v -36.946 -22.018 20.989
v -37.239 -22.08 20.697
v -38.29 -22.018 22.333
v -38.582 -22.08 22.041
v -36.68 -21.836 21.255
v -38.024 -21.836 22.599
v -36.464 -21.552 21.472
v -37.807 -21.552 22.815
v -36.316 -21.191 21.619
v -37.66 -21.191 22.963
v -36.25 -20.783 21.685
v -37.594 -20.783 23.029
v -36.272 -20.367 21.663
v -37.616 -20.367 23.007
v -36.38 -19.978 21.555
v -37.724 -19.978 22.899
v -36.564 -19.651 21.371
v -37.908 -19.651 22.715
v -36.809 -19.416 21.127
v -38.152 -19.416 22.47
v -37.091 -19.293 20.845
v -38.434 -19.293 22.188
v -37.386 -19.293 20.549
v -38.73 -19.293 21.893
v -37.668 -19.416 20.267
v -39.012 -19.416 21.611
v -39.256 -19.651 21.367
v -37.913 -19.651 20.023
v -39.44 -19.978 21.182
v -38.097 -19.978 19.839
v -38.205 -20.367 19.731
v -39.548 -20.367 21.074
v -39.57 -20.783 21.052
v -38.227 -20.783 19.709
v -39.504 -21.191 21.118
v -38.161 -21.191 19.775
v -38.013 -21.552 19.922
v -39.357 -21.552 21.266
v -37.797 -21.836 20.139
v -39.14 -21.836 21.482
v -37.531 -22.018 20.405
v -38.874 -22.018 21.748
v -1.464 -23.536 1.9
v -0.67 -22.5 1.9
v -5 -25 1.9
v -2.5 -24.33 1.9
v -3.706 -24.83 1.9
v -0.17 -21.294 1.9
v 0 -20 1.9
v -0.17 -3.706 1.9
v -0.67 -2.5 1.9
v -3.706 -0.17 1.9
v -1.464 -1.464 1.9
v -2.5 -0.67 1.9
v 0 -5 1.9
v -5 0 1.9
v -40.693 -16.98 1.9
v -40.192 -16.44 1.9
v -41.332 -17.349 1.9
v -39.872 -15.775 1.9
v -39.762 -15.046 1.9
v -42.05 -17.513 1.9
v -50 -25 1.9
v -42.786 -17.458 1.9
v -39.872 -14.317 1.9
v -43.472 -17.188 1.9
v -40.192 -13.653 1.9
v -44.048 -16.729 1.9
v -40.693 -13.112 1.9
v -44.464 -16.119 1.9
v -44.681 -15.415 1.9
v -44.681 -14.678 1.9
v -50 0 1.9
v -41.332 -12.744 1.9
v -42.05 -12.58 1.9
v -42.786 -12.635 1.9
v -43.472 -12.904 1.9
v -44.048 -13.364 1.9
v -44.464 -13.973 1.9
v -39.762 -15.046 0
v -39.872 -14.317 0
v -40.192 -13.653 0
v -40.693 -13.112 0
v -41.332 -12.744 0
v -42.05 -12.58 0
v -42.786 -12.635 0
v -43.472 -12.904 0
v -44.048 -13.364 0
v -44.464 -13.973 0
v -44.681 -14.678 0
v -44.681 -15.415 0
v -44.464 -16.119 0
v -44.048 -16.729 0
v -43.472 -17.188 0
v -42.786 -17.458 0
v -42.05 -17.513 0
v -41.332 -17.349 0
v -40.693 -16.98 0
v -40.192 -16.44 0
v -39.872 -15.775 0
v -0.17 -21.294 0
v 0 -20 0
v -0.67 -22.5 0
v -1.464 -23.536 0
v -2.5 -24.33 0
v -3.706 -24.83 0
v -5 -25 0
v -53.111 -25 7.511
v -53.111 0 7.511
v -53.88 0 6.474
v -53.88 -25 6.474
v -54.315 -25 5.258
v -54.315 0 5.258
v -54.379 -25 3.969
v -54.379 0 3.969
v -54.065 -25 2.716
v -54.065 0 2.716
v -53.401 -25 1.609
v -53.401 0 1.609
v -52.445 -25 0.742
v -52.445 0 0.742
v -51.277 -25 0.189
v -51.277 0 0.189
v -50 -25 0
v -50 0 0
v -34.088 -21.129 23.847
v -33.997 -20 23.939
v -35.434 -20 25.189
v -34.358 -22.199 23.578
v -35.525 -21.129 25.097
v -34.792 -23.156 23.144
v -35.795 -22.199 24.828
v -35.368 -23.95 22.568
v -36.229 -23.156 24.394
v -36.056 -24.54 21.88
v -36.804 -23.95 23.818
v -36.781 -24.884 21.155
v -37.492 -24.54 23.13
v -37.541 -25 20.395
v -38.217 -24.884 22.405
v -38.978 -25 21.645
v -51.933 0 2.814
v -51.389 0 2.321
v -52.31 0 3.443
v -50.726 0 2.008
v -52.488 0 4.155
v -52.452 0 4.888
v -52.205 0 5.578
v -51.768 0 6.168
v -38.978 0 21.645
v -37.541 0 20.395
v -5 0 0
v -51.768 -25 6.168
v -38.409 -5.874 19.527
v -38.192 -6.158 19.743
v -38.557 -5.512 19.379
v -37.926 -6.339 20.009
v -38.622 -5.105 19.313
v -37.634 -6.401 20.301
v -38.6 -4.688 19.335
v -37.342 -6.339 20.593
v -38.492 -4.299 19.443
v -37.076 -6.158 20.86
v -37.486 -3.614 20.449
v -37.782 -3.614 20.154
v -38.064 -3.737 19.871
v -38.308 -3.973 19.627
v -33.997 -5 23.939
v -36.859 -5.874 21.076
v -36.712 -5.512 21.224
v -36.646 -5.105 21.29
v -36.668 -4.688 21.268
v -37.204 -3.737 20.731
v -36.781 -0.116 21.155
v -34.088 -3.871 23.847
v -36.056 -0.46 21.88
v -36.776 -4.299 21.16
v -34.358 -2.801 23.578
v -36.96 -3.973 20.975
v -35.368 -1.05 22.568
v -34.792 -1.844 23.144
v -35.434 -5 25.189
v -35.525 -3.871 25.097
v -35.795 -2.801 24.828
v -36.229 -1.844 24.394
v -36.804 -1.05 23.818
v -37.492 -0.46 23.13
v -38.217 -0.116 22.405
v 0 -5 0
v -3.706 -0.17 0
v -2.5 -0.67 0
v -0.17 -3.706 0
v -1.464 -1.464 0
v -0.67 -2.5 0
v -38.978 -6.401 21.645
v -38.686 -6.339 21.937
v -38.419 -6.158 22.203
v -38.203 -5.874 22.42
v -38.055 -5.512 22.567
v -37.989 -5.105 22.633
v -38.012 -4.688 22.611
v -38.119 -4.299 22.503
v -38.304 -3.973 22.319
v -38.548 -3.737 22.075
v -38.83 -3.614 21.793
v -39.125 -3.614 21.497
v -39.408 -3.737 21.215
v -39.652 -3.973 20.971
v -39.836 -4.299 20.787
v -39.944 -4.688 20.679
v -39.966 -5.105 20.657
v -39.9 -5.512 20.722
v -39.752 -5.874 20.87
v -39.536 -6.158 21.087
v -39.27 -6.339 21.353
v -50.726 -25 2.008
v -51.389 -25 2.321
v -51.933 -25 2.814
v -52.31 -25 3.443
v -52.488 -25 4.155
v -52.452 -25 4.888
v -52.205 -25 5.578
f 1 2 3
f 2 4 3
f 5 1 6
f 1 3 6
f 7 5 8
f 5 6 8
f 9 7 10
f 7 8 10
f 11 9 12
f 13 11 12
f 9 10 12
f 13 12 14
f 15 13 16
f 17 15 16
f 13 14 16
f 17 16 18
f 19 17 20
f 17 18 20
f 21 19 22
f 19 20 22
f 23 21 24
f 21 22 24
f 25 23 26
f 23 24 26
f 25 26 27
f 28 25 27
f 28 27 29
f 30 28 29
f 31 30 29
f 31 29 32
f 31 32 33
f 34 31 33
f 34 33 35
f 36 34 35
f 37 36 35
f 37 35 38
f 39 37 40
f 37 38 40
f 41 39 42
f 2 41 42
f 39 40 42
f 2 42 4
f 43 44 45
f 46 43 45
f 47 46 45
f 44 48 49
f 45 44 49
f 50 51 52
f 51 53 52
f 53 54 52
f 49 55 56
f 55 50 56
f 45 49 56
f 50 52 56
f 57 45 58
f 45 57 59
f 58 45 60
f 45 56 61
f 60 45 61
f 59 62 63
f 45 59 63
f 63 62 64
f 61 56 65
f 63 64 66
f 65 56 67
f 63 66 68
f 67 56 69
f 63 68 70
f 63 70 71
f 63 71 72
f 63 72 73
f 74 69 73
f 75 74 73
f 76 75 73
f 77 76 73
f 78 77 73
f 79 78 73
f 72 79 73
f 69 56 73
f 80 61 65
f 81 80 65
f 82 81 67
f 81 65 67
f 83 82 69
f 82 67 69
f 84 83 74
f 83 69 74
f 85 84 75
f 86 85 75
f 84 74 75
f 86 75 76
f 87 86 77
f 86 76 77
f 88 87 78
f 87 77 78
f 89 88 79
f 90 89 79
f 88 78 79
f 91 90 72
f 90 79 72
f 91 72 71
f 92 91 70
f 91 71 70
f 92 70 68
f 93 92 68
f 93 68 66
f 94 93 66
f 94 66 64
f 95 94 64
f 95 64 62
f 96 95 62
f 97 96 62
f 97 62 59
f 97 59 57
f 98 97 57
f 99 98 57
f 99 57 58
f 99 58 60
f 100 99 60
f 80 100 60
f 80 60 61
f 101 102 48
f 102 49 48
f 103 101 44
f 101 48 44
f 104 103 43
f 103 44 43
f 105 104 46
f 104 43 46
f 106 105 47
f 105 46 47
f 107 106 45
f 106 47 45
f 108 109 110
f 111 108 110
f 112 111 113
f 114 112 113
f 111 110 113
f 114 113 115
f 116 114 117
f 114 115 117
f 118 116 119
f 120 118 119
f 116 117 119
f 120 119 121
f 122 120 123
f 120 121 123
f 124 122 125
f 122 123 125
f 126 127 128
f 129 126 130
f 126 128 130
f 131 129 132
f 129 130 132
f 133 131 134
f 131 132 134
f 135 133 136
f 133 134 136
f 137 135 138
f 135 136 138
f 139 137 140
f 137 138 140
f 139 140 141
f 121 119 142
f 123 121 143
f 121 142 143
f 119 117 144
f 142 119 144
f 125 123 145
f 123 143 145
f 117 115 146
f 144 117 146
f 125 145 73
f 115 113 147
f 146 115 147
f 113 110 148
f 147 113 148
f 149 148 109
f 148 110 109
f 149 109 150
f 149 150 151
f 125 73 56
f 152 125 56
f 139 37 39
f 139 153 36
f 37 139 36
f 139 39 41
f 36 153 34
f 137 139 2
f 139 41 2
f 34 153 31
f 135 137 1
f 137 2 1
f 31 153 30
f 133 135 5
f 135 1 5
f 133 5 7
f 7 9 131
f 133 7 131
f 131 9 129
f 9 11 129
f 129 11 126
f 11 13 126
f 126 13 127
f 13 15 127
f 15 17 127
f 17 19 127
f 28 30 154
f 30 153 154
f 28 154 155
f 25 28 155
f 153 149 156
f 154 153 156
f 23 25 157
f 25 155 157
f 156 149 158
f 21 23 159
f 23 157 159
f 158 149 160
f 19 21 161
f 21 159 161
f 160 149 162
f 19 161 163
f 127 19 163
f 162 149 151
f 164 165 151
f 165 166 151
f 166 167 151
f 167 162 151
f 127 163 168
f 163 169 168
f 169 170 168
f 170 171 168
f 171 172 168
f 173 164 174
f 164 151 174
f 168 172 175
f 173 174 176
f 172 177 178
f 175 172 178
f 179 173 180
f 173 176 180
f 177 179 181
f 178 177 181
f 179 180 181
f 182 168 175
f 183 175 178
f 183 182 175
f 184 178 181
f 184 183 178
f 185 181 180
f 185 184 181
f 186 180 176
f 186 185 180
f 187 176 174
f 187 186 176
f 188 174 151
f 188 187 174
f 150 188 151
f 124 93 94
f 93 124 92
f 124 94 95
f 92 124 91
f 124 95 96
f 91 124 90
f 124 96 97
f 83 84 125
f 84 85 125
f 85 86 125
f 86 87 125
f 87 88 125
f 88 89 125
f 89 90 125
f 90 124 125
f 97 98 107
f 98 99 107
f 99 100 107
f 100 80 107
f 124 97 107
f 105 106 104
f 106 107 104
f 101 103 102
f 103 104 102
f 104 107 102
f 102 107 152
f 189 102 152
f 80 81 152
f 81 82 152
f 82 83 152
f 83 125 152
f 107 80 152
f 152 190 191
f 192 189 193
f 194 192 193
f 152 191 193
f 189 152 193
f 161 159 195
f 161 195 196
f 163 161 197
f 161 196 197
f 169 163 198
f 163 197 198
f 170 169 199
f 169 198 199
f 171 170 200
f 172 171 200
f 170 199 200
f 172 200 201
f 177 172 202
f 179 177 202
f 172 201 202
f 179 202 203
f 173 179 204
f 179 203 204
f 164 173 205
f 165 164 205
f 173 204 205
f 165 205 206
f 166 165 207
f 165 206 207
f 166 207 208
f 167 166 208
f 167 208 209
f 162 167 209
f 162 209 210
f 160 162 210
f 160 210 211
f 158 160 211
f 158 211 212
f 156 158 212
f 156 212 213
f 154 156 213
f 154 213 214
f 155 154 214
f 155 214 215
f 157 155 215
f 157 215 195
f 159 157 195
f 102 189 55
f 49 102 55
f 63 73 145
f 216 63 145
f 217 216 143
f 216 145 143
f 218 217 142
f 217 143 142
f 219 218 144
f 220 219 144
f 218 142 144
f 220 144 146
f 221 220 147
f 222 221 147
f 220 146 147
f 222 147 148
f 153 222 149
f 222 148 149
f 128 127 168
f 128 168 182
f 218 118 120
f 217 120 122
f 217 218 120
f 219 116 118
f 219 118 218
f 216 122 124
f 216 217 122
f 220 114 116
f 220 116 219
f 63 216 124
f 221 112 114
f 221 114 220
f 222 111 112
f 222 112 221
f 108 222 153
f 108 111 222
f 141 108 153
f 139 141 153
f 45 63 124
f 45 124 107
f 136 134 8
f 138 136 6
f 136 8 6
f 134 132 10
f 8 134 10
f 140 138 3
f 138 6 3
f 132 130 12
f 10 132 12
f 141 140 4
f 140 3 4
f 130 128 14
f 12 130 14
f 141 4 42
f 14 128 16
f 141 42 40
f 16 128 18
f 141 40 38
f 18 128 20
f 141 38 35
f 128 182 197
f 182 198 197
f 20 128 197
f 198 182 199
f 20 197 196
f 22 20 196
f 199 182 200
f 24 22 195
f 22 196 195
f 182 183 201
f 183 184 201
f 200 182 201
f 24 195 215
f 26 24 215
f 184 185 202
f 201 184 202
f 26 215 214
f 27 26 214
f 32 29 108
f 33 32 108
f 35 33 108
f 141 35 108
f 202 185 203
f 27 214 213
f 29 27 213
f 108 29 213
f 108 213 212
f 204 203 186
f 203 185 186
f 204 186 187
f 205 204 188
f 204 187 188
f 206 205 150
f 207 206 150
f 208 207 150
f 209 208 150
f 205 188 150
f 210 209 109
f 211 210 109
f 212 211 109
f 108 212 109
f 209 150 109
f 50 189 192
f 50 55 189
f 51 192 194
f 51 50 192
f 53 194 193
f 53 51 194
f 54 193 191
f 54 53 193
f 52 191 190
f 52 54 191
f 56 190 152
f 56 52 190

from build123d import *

# Parameters (mm, degrees)
F2_DEPTH = 25
F3_R     = 5
F4_R     = 1.401412
F5_DEPTH = 12.5
F6_R     = 2.473505
F7_DEPTH = 1.901001


with BuildPart() as f2:
    # F0 (on Front) → F2 (new body)
    with BuildSketch(Plane.XZ):
        with BuildLine():
            Line((-50, 0), (0, 0))
            Line((0, 0), (0, 1.900001))
            Line((0, 1.900001), (-50, 1.900001))
            ThreePointArc((-50, 1.900001), (-52.309698, 3.443292), (-51.767766, 6.167766))
            Line((-51.767766, 6.167766), (-33.996891, 23.938641))
            Line((-33.996891, 23.938641), (-35.4336, 25.188939))
            Line((-35.4336, 25.188939), (-53.11127, 7.51127))
            ThreePointArc((-53.11127, 7.51127), (-54.06507, 2.716193), (-50, 0))
        make_face()
    extrude(amount=F2_DEPTH)

    # F3
    f3_edges = [f2.edges().sort_by_distance(p)[0] for p in [
        (-34.715246, -25, 24.56379),
        (-34.715246, 0, 24.56379),
        (0, -25, 0.950001),
        (0, 0, 0.950001),
    ]]
    fillet(f3_edges, radius=F3_R)

    # F4 (on face) → F5 (cut, symmetric)
    with BuildSketch(Plane(origin=(-30.31127, 0, 30.31127), x_dir=(0, -1, 0), z_dir=(-0.707107, 0, 0.707107))):
        with Locations((5, -12.256087)):
            Circle(F4_R)
        with Locations((20.678569, -11.696595)):
            Circle(F4_R)
    extrude(amount=F5_DEPTH, both=True, mode=Mode.SUBTRACT)

    # F6 (on face) → F7 (cut, through all)
    with BuildSketch(Plane.XY.offset(1.900001)):
        with Locations((-42.235214, -15.046177)):
            Circle(F6_R)
    extrude(amount=-F7_DEPTH, mode=Mode.SUBTRACT)


solid = f2.part
